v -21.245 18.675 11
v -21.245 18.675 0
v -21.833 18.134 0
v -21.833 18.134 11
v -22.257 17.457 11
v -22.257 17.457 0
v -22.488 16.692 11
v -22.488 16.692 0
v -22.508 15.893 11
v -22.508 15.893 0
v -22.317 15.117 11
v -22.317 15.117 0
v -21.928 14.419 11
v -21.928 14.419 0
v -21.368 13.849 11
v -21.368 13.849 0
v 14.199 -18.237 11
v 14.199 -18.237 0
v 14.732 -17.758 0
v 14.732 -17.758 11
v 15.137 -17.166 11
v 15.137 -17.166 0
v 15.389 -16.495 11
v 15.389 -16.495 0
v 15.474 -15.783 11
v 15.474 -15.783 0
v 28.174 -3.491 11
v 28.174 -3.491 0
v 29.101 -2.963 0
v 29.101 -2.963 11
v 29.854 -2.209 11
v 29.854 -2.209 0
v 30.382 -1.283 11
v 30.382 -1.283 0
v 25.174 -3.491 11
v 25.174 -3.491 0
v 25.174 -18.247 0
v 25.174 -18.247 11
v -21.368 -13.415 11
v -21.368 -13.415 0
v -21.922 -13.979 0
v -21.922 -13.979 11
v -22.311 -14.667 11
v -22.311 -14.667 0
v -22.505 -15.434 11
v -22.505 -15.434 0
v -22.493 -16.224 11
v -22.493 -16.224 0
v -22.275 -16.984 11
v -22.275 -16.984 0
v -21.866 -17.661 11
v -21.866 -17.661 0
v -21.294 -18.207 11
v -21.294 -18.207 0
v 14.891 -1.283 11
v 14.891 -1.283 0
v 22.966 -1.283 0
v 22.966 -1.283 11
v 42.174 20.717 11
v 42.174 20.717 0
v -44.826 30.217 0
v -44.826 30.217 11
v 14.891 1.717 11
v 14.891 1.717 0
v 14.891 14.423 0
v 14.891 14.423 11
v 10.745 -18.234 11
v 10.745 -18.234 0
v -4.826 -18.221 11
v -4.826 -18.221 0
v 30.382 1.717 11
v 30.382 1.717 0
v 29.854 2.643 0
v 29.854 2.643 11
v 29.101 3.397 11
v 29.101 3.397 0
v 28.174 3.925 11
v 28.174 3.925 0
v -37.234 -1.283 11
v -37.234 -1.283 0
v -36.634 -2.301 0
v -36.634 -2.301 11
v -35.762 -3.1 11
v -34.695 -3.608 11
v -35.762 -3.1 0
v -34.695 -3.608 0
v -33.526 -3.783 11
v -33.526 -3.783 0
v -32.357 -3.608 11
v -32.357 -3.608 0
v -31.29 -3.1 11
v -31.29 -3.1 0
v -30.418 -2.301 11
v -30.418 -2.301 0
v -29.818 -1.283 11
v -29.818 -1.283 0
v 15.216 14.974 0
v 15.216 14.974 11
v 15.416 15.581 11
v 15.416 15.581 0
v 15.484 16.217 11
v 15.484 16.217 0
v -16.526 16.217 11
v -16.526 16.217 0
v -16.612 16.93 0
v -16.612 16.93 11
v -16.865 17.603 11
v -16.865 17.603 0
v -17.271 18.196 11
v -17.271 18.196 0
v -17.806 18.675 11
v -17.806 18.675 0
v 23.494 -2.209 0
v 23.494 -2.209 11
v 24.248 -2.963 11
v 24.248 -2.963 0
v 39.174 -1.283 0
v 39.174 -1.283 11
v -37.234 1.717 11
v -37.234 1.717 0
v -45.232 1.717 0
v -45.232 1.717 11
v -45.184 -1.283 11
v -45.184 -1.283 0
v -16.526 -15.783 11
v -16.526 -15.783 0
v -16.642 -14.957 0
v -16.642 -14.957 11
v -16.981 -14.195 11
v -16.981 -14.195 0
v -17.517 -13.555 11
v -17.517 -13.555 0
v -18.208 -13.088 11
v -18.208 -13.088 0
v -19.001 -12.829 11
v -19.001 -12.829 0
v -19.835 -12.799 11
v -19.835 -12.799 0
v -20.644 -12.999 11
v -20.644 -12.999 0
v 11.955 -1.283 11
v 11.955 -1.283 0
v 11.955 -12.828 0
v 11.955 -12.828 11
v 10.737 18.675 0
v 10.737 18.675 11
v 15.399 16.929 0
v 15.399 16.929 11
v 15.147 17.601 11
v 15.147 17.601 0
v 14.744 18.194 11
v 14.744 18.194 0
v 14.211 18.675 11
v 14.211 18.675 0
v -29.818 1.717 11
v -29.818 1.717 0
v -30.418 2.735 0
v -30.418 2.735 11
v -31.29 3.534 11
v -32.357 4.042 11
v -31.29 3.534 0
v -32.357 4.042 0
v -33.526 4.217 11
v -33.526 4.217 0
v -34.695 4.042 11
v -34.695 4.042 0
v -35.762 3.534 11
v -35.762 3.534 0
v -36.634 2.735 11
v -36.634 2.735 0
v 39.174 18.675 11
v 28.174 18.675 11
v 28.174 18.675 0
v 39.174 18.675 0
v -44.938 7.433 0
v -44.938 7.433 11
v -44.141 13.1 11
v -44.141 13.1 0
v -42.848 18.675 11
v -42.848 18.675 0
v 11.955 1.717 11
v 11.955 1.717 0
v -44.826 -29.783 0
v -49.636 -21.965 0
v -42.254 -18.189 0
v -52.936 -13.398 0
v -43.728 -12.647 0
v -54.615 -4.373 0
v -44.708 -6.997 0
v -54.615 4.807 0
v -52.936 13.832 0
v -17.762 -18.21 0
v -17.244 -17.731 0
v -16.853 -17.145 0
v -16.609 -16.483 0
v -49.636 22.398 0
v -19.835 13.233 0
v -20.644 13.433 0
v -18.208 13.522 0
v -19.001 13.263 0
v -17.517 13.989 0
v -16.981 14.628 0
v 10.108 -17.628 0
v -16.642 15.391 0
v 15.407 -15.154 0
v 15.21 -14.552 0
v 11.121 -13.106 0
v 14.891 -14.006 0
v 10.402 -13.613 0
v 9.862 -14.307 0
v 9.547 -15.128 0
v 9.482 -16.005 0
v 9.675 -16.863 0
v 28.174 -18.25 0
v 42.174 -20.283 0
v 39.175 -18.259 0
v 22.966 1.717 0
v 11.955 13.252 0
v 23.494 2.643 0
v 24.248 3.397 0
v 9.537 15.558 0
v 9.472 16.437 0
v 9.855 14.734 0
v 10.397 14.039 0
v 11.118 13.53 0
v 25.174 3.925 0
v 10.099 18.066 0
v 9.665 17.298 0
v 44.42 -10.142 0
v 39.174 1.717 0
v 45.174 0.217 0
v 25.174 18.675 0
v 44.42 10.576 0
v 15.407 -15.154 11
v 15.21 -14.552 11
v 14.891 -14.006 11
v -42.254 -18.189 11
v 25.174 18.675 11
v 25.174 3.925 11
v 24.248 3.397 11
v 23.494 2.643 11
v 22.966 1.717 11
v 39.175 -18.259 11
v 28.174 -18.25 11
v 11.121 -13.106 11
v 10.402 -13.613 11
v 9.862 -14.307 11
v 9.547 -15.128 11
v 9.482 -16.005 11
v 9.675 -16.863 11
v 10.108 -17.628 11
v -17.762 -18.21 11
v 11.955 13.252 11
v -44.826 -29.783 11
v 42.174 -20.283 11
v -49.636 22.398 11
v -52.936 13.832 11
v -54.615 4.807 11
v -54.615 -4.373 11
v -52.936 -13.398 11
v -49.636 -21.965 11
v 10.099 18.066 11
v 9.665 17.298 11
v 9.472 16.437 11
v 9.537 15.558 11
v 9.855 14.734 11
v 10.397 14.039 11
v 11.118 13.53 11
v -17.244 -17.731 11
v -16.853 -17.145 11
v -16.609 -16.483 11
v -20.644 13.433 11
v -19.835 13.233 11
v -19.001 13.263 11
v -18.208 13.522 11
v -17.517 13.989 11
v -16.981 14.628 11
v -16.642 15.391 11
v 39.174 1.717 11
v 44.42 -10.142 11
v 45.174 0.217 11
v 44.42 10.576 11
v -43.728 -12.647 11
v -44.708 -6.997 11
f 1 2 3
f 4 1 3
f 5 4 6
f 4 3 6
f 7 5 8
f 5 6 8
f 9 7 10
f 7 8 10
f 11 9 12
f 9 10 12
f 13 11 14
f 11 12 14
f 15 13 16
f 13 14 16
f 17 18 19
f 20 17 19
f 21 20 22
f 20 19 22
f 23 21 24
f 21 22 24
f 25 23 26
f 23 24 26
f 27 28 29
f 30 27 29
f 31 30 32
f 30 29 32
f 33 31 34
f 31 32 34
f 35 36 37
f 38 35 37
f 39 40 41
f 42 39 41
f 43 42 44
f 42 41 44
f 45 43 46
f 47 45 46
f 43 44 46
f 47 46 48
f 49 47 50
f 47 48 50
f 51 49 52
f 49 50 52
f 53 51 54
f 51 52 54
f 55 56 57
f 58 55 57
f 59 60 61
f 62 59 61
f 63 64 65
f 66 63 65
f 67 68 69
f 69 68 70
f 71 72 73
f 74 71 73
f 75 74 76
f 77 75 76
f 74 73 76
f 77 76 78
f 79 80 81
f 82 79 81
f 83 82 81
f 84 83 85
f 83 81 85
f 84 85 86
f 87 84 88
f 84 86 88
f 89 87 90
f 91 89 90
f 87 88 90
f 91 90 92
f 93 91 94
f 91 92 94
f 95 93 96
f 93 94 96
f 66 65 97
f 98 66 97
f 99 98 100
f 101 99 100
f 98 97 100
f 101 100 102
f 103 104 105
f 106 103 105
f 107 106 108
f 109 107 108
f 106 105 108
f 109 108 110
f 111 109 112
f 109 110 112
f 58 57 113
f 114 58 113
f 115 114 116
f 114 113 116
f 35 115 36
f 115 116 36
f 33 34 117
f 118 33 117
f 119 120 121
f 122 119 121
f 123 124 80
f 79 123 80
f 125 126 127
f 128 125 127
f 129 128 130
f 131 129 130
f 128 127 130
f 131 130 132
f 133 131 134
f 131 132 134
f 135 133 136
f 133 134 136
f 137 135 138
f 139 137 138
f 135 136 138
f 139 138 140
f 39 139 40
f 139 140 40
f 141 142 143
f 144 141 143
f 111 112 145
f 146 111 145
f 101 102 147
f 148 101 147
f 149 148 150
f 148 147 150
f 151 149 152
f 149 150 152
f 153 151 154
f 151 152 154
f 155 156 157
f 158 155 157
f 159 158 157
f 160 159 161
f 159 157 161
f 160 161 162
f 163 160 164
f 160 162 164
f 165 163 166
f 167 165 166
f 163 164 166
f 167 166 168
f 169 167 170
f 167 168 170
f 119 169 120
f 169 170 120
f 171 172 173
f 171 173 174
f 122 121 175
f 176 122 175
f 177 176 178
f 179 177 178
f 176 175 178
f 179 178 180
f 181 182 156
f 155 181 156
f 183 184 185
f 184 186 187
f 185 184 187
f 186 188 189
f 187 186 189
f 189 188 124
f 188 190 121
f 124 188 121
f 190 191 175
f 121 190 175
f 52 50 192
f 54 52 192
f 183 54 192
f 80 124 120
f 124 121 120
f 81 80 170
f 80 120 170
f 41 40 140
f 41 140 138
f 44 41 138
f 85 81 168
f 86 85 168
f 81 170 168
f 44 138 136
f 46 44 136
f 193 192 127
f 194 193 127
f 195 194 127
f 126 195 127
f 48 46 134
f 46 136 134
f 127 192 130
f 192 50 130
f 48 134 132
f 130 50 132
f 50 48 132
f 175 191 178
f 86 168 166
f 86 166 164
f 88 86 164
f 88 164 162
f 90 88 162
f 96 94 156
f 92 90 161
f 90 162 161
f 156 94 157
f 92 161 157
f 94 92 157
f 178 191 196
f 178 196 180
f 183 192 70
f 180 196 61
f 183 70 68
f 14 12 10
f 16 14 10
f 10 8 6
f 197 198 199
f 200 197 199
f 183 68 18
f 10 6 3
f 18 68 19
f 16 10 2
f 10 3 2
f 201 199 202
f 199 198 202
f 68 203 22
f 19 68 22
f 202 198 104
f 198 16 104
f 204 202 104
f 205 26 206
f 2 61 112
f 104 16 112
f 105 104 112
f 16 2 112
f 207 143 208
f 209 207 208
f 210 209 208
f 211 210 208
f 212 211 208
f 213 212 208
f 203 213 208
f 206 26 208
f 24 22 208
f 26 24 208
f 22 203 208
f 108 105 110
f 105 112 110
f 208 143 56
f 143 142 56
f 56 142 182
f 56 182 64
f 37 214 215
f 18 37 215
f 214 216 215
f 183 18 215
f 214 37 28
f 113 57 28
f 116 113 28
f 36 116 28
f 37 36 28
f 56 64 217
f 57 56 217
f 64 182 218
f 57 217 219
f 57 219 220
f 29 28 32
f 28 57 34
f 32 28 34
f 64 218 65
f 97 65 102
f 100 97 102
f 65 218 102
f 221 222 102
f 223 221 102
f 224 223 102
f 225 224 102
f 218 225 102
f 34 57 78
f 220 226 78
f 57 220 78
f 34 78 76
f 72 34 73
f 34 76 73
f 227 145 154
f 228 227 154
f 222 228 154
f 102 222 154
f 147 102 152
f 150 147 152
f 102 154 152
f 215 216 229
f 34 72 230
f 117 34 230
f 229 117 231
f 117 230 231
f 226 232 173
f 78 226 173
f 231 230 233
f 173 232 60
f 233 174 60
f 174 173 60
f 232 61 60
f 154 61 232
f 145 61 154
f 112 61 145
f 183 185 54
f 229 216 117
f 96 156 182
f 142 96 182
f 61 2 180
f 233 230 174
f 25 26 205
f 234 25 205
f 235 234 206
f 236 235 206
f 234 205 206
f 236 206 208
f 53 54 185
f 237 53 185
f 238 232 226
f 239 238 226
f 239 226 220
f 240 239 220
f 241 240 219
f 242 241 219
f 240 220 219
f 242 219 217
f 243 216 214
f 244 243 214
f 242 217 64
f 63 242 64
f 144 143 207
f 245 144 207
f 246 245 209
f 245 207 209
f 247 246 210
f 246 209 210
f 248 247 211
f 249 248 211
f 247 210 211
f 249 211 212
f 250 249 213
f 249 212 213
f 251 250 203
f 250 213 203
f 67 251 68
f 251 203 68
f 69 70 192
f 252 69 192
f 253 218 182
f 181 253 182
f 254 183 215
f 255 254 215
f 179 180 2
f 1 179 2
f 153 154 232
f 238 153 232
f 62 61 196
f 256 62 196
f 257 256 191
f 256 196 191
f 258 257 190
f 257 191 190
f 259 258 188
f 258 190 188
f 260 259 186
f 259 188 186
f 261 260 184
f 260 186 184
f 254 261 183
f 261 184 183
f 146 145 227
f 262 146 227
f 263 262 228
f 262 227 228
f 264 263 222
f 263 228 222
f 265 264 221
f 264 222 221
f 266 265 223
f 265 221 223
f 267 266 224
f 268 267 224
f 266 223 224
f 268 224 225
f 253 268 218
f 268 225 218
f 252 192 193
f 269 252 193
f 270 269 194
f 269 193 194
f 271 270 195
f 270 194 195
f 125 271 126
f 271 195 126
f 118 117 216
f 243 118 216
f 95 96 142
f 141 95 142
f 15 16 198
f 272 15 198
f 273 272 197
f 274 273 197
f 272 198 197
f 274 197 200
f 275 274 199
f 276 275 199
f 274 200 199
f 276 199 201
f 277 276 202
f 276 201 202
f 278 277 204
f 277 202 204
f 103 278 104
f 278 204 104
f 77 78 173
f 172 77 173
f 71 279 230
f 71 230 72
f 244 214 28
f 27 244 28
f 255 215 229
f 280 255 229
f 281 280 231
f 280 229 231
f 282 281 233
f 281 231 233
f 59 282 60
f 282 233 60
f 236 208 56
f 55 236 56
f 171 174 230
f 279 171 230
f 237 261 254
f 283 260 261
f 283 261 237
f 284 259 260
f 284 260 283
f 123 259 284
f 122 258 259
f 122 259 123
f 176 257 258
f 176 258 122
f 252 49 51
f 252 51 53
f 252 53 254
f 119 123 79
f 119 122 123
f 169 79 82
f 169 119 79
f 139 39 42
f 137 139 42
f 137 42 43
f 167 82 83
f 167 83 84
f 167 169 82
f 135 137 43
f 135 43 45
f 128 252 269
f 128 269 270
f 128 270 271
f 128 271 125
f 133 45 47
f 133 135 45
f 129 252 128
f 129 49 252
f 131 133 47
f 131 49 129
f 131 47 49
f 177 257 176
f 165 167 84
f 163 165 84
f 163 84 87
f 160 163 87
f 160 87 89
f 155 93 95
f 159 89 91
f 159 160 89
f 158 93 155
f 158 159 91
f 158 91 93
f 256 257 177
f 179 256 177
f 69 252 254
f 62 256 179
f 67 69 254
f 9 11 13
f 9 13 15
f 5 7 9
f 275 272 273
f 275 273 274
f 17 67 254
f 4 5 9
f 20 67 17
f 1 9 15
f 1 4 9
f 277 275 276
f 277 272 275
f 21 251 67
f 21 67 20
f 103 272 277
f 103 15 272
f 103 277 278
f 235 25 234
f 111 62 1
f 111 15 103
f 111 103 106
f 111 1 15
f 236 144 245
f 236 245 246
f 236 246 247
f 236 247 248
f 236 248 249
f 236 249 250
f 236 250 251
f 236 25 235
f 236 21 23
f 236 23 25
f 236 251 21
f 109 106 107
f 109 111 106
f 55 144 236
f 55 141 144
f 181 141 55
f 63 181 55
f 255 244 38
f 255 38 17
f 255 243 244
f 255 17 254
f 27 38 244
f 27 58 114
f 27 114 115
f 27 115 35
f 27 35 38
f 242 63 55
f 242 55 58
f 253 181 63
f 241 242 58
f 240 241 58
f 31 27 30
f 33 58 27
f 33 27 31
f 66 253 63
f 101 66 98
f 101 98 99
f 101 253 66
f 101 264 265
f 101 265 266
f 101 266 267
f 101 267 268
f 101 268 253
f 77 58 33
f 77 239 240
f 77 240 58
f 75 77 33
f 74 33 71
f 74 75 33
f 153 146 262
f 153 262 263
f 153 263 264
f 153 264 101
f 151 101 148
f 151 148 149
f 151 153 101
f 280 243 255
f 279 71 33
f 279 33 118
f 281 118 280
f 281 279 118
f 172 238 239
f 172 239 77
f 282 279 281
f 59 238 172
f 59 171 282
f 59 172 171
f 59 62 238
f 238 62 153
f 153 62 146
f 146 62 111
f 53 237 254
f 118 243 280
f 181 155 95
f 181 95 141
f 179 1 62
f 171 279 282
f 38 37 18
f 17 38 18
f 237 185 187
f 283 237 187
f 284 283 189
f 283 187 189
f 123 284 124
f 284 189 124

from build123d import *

# Parameters (mm, degrees)
F0_W     = 16.7806061562
F0_H     = 3
F0_R     = 1.3
F0_W_2   = 2.9361768566
F1_DEPTH = 11


with BuildPart() as f1:
    # F0 (on Top) → F1 (new body)
    with BuildSketch(Plane.XY):
        with BuildLine():
            ThreePointArc((-45.8257364572, 20.7169244225), (-48.8257364572, 0.2169244225), (-45.8257364572, -20.2830755775))
            Line((-45.8257364572, -20.2830755775), (42.1742635428, -20.2830755775))
            Line((42.1742635428, -20.2830755775), (42.1742635428, 20.7169244225))
            Line((42.1742635428, 20.7169244225), (-45.8257364572, 20.7169244225))
        make_face()
        with BuildLine():
            Line((28.1742635428, -18.2495740318), (25.1742635428, -18.2469775091))
            Line((25.1742635428, -18.2469775091), (14.1993448848, -18.237478634))
            ThreePointArc((14.1993448848, -18.237478634), (12.4716670211, -18.7830744539), (10.7449361797, -18.2344888171))
            Line((10.7449361797, -18.2344888171), (-4.8257364572, -18.2210122822))
            Line((-4.8257364572, -18.2210122822), (-17.7619531763, -18.2098158887))
            ThreePointArc((-17.7619531763, -18.2098158887), (-19.5283329789, -18.7830744539), (-21.2937178166, -18.2067591197))
            Line((-21.2937178166, -18.2067591197), (-42.2537405073, -18.1886180616))
            ThreePointArc((-42.2537405073, -18.1886180616), (-44.2806098516, -9.8331874592), (-45.1844940816, -1.2830755775))
            ThreePointArc((-45.1844940816, -1.2830755775), (-45.2256405593, 0.2166491767), (-45.2320870806, 1.7169244225))
            ThreePointArc((-45.2320870806, 1.7169244225), (-44.6021619414, 10.2751402015), (-42.8478999843, 18.6752847233))
            Line((-42.8478999843, 18.6752847233), (-21.2452392134, 18.6752389409))
            ThreePointArc((-21.2452392134, 18.6752389409), (-19.5257300993, 19.2169244225), (-17.8062232813, 18.6752316526))
            Line((-17.8062232813, 18.6752316526), (-4.8257364572, 18.6752041432))
            Line((-4.8257364572, 18.6752041432), (10.7373164071, 18.6751711606))
            ThreePointArc((10.7373164071, 18.6751711606), (12.4742648349, 19.226898626), (14.2112109241, 18.6751637984))
            Line((14.2112109241, 18.6751637984), (25.1742635428, 18.6751405645))
            Line((25.1742635428, 18.6751405645), (28.1742635428, 18.6751342066))
            Line((28.1742635428, 18.6751342066), (39.1738213035, 18.6751108953))
            Line((39.1738213035, 18.6751108953), (39.1742646816, 1.7169244225))
            Line((39.1742646816, 1.7169244225), (39.1743431177, -1.2830755775))
            Line((39.1743431177, -1.2830755775), (39.174786962, -18.259095068))
            Line((39.174786962, -18.259095068), (28.1742635428, -18.2495740318))
        make_face(mode=Mode.SUBTRACT)
        with BuildLine():
            Line((42.1742635428, -20.2830755775), (-45.8257364572, -20.2830755775))
            ThreePointArc((-45.8257364572, -20.2830755775), (-48.8257364572, 0.2169244225), (-45.8257364572, 20.7169244225))
            Line((-45.8257364572, 20.7169244225), (42.1742635428, 20.7169244225))
            Line((42.1742635428, 20.7169244225), (-44.8257364572, 30.2169244225))
            ThreePointArc((-44.8257364572, 30.2169244225), (-54.8257364572, 0.2169244225), (-44.8257364572, -29.7830755775))
            Line((-44.8257364572, -29.7830755775), (42.1742635428, -20.2830755775))
        make_face()
        with BuildLine():
            Line((42.1742635428, 20.7169244225), (42.1742635428, -20.2830755775))
            ThreePointArc((42.1742635428, -20.2830755775), (45.1742635428, 0.2169244225), (42.1742635428, 20.7169244225))
        make_face()
        with BuildLine():
            Line((-21.3677669063, -1.2830755775), (-4.8257364572, -1.2830755775))
            Line((-4.8257364572, -1.2830755775), (-4.8257364572, 1.7169244225))
            Line((-4.8257364572, 1.7169244225), (-21.3677669063, 1.7169244225))
            Line((-21.3677669063, 1.7169244225), (-29.8176372136, 1.7169244225))
            ThreePointArc((-29.8176372136, 1.7169244225), (-29.5993897472, 0.9809934723), (-29.5257364572, 0.2169244225))
            ThreePointArc((-29.5257364572, 0.2169244225), (-29.5993897472, -0.5471446273), (-29.8176372136, -1.2830755775))
            Line((-29.8176372136, -1.2830755775), (-21.3677669063, -1.2830755775))
        make_face()
        with Locations((3.5645666209, 0.2169244225)):
            Rectangle(F0_W, F0_H)
        with BuildLine():
            Line((25.1742635428, -3.4911748211), (25.1742635428, -18.2469775091))
            Line((25.1742635428, -18.2469775091), (28.1742635428, -18.2495740318))
            Line((28.1742635428, -18.2495740318), (28.1742635428, -3.4911748211))
            ThreePointArc((28.1742635428, -3.4911748211), (26.6742635428, -3.7830755775), (25.1742635428, -3.4911748211))
        make_face()
        with BuildLine():
            Line((25.1742635428, 18.6751405645), (25.1742635428, 3.925023666))
            ThreePointArc((25.1742635428, 3.925023666), (26.6742635428, 4.2169244225), (28.1742635428, 3.925023666))
            Line((28.1742635428, 3.925023666), (28.1742635428, 18.6751342066))
            Line((28.1742635428, 18.6751342066), (25.1742635428, 18.6751405645))
        make_face()
        with BuildLine():
            Line((11.954869699, -1.2830755775), (11.954869699, -12.8283793097))
            ThreePointArc((11.954869699, -12.8283793097), (13.5907430688, -12.9985696127), (14.8910465556, -14.0056730151))
            Line((14.8910465556, -14.0056730151), (14.8910465556, -1.2830755775))
            Line((14.8910465556, -1.2830755775), (11.954869699, -1.2830755775))
        make_face()
        with BuildLine():
            Line((11.954869699, 1.7169244225), (14.8910465556, 1.7169244225))
            Line((14.8910465556, 1.7169244225), (14.8910465556, 14.4227449479))
            ThreePointArc((14.8910465556, 14.4227449479), (13.5889929924, 13.4209788545), (11.954869699, 13.2521006461))
            Line((11.954869699, 13.2521006461), (11.954869699, 1.7169244225))
        make_face()
        with BuildLine():
            ThreePointArc((11.954869699, 13.2521006461), (13.5889929924, 13.4209788545), (14.8910465556, 14.4227449479))
            ThreePointArc((14.8910465556, 14.4227449479), (15.3320910736, 15.2720765855), (15.4842326594, 16.2169244225))
            ThreePointArc((15.4842326594, 16.2169244225), (15.1470965382, 17.6010780599), (14.2112109241, 18.6751637984))
            Line((14.2112109241, 18.6751637984), (10.7373164071, 18.6751711606))
            ThreePointArc((10.7373164071, 18.6751711606), (9.5373926729, 15.5575580004), (11.954869699, 13.2521006461))
        make_face()
        with Locations((12.4742634653, 16.2169244225)):
            Circle(F0_R, mode=Mode.SUBTRACT)
        with BuildLine():
            ThreePointArc((-21.2452392134, 18.6752389409), (-22.5247701001, 16.2930638272), (-21.3677669063, 13.8490300362))
            ThreePointArc((-21.3677669063, 13.8490300362), (-18.2078008266, 13.5219205869), (-16.5257364572, 16.2169244225))
            ThreePointArc((-16.5257364572, 16.2169244225), (-16.8650467414, 17.6028285448), (-17.8062232813, 18.6752316526))
            Line((-17.8062232813, 18.6752316526), (-21.2452392134, 18.6752389409))
        make_face()
        with Locations((-19.5257364572, 16.2169244225)):
            Circle(F0_R, mode=Mode.SUBTRACT)
        with BuildLine():
            Line((10.7449361797, -18.2344888171), (14.1993448848, -18.237478634))
            ThreePointArc((14.1993448848, -18.237478634), (15.1365223606, -17.1659631315), (15.4742635428, -15.7830755775))
            ThreePointArc((15.4742635428, -15.7830755775), (15.3247327181, -14.8477545199), (14.8910465556, -14.0056730151))
            ThreePointArc((14.8910465556, -14.0056730151), (13.5907430688, -12.9985696127), (11.954869699, -12.8283793097))
            ThreePointArc((11.954869699, -12.8283793097), (9.5466891598, -15.1278594056), (10.7449361797, -18.2344888171))
        make_face()
        with Locations((12.4742635428, -15.7830755775)):
            Circle(F0_R, mode=Mode.SUBTRACT)
        with BuildLine():
            Line((-21.2937178166, -18.2067591197), (-17.7619531763, -18.2098158887))
            ThreePointArc((-17.7619531763, -18.2098158887), (-16.852596932, -17.1448116308), (-16.5257364572, -15.7830755775))
            ThreePointArc((-16.5257364572, -15.7830755775), (-18.2078008266, -13.088071742), (-21.3677669063, -13.4151811912))
            ThreePointArc((-21.3677669063, -13.4151811912), (-22.5253782817, -15.8294320701), (-21.2937178166, -18.2067591197))
        make_face()
        with Locations((-19.5257364572, -15.7830755775)):
            Circle(F0_R, mode=Mode.SUBTRACT)
        with BuildLine():
            Line((30.3823627864, -1.2830755775), (39.1743431177, -1.2830755775))
            Line((39.1743431177, -1.2830755775), (39.1742646816, 1.7169244225))
            Line((39.1742646816, 1.7169244225), (30.3823627864, 1.7169244225))
            ThreePointArc((30.3823627864, 1.7169244225), (30.6742635428, 0.2169244225), (30.3823627864, -1.2830755775))
        make_face()
        with BuildLine():
            Line((14.8910465556, -1.2830755775), (22.9661642993, -1.2830755775))
            ThreePointArc((22.9661642993, -1.2830755775), (22.6742635428, 0.2169244225), (22.9661642993, 1.7169244225))
            Line((22.9661642993, 1.7169244225), (14.8910465556, 1.7169244225))
            Line((14.8910465556, 1.7169244225), (14.8910465556, -1.2830755775))
        make_face()
        with BuildLine():
            Line((-37.2338357007, -1.2830755775), (-29.8176372136, -1.2830755775))
            ThreePointArc((-29.8176372136, -1.2830755775), (-29.5993897472, -0.5471446273), (-29.5257364572, 0.2169244225))
            ThreePointArc((-29.5257364572, 0.2169244225), (-29.5993897472, 0.9809934723), (-29.8176372136, 1.7169244225))
            Line((-29.8176372136, 1.7169244225), (-37.2338357007, 1.7169244225))
            ThreePointArc((-37.2338357007, 1.7169244225), (-37.5257364572, 0.2169244225), (-37.2338357007, -1.2830755775))
        make_face()
        with Locations((-33.5257364572, 0.2169244225)):
            Circle(F0_R, mode=Mode.SUBTRACT)
        with BuildLine():
            ThreePointArc((22.9661642993, 1.7169244225), (22.6742635428, 0.2169244225), (22.9661642993, -1.2830755775))
            Line((22.9661642993, -1.2830755775), (30.3823627864, -1.2830755775))
            ThreePointArc((30.3823627864, -1.2830755775), (30.6742635428, 0.2169244225), (30.3823627864, 1.7169244225))
            Line((30.3823627864, 1.7169244225), (22.9661642993, 1.7169244225))
        make_face()
        with Locations((26.6742635428, 0.2169244225)):
            Circle(F0_R, mode=Mode.SUBTRACT)
        with BuildLine():
            ThreePointArc((-45.2320870806, 1.7169244225), (-45.2256405593, 0.2166491767), (-45.1844940816, -1.2830755775))
            Line((-45.1844940816, -1.2830755775), (-37.2338357007, -1.2830755775))
            ThreePointArc((-37.2338357007, -1.2830755775), (-37.5257364572, 0.2169244225), (-37.2338357007, 1.7169244225))
            Line((-37.2338357007, 1.7169244225), (-45.2320870806, 1.7169244225))
        make_face()
        with BuildLine():
            ThreePointArc((-37.2338357007, -1.2830755775), (-33.5257364572, -3.7830755775), (-29.8176372136, -1.2830755775))
            Line((-29.8176372136, -1.2830755775), (-37.2338357007, -1.2830755775))
        make_face()
        with BuildLine():
            Line((-37.2338357007, 1.7169244225), (-29.8176372136, 1.7169244225))
            ThreePointArc((-29.8176372136, 1.7169244225), (-33.5257364572, 4.2169244225), (-37.2338357007, 1.7169244225))
        make_face()
        with BuildLine():
            ThreePointArc((25.1742635428, 3.925023666), (23.8458364181, 3.0453515472), (22.9661642993, 1.7169244225))
            Line((22.9661642993, 1.7169244225), (30.3823627864, 1.7169244225))
            ThreePointArc((30.3823627864, 1.7169244225), (29.5026906676, 3.0453515472), (28.1742635428, 3.925023666))
            ThreePointArc((28.1742635428, 3.925023666), (26.6742635428, 4.2169244225), (25.1742635428, 3.925023666))
        make_face()
        with BuildLine():
            ThreePointArc((22.9661642993, -1.2830755775), (23.8458364181, -2.6115027023), (25.1742635428, -3.4911748211))
            ThreePointArc((25.1742635428, -3.4911748211), (26.6742635428, -3.7830755775), (28.1742635428, -3.4911748211))
            ThreePointArc((28.1742635428, -3.4911748211), (29.5026906676, -2.6115027023), (30.3823627864, -1.2830755775))
            Line((30.3823627864, -1.2830755775), (22.9661642993, -1.2830755775))
        make_face()
        with Locations((13.4229581273, 0.2169244225)):
            Rectangle(F0_W_2, F0_H)
        with Locations((12.4742634653, 16.2169244225)):
            Circle(F0_R)
        with Locations((-19.5257364572, 16.2169244225)):
            Circle(F0_R)
        with Locations((-19.5257364572, -15.7830755775)):
            Circle(F0_R)
        with Locations((12.4742635428, -15.7830755775)):
            Circle(F0_R)
        with Locations((-33.5257364572, 0.2169244225)):
            Circle(F0_R)
        with Locations((26.6742635428, 0.2169244225)):
            Circle(F0_R)
        with BuildLine():
            ThreePointArc((-21.2937178166, -18.2067591197), (-19.5283329789, -18.7830744539), (-17.7619531763, -18.2098158887))
            Line((-17.7619531763, -18.2098158887), (-21.2937178166, -18.2067591197))
        make_face()
        with BuildLine():
            Line((10.7373164071, 18.6751711606), (14.2112109241, 18.6751637984))
            ThreePointArc((14.2112109241, 18.6751637984), (12.4742648349, 19.226898626), (10.7373164071, 18.6751711606))
        make_face()
        with BuildLine():
            ThreePointArc((10.7449361797, -18.2344888171), (12.4716670211, -18.7830744539), (14.1993448848, -18.237478634))
            Line((14.1993448848, -18.237478634), (10.7449361797, -18.2344888171))
        make_face()
        with BuildLine():
            Line((-21.2452392134, 18.6752389409), (-17.8062232813, 18.6752316526))
            ThreePointArc((-17.8062232813, 18.6752316526), (-19.5257300993, 19.2169244225), (-21.2452392134, 18.6752389409))
        make_face()
    extrude(amount=F1_DEPTH)


solid = f1.part
